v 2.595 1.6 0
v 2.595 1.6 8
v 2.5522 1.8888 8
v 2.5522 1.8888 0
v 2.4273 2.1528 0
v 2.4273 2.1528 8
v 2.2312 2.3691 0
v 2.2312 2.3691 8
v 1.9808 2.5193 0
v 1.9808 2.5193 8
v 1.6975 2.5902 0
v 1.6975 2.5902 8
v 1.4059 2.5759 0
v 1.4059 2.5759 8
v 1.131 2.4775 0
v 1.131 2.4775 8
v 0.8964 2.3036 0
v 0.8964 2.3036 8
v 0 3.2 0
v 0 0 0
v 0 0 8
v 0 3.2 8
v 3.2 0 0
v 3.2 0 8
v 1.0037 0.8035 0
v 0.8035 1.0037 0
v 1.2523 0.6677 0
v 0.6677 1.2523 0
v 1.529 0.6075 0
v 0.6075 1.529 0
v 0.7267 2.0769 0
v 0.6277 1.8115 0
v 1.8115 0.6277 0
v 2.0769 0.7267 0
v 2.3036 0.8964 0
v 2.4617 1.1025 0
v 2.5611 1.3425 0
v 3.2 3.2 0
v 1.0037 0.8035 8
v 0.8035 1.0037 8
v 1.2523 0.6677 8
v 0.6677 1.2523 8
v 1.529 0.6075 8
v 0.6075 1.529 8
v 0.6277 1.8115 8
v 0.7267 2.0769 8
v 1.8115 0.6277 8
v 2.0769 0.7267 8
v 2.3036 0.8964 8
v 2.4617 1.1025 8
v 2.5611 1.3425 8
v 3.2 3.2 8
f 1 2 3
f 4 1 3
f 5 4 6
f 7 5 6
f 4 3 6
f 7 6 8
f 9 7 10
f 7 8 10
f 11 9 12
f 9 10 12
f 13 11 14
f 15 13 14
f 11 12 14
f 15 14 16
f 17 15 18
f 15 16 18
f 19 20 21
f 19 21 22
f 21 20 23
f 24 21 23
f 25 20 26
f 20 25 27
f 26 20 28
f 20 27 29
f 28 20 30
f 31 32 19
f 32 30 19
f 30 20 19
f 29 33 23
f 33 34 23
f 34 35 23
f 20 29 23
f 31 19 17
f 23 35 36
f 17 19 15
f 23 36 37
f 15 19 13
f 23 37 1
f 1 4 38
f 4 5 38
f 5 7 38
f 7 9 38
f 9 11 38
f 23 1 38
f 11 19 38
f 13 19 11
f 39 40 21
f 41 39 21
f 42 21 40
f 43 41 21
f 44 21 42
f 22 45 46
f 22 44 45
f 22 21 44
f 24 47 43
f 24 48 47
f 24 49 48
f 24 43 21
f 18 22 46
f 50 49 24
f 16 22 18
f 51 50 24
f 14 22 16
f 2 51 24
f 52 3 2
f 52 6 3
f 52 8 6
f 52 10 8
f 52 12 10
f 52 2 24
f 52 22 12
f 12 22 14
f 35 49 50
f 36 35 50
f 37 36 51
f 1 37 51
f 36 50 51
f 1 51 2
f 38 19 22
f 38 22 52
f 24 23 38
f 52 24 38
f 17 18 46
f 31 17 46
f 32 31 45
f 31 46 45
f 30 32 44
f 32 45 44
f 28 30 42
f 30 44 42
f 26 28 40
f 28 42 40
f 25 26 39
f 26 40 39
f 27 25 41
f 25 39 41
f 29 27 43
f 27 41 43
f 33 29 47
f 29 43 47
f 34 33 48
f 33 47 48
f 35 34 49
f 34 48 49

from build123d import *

# Parameters (mm, degrees)
F0_W     = 3.2
F0_H     = 3.2
F1_DEPTH = 8
F3_DEPTH = 25


with BuildPart() as f1:
    # F0 (on Top) → F1 (new body)
    with BuildSketch(Plane.XY):
        with Locations((1.6, 1.6)):
            Rectangle(F0_W, F0_H)
    extrude(amount=F1_DEPTH)

    # F2 (on face) → F3 (cut)
    with BuildSketch(Plane.XY.offset(8)):
        with BuildLine():
            Line((2.3035712473, 0.8964287527), (0.8964287527, 2.3035712473))
            ThreePointArc((0.8964287527, 2.3035712473), (0.8964287527, 0.8964287527), (2.3035712473, 0.8964287527))
        make_face()
        with BuildLine():
            ThreePointArc((2.595, 1.6), (1.9807700152, 2.5192601348), (0.8964287527, 2.3035712473))
            Line((0.8964287527, 2.3035712473), (2.3035712473, 0.8964287527))
            ThreePointArc((2.3035712473, 0.8964287527), (2.5192601348, 1.2192299848), (2.595, 1.6))
        make_face()
    extrude(amount=-F3_DEPTH, mode=Mode.SUBTRACT)


solid = f1.part
